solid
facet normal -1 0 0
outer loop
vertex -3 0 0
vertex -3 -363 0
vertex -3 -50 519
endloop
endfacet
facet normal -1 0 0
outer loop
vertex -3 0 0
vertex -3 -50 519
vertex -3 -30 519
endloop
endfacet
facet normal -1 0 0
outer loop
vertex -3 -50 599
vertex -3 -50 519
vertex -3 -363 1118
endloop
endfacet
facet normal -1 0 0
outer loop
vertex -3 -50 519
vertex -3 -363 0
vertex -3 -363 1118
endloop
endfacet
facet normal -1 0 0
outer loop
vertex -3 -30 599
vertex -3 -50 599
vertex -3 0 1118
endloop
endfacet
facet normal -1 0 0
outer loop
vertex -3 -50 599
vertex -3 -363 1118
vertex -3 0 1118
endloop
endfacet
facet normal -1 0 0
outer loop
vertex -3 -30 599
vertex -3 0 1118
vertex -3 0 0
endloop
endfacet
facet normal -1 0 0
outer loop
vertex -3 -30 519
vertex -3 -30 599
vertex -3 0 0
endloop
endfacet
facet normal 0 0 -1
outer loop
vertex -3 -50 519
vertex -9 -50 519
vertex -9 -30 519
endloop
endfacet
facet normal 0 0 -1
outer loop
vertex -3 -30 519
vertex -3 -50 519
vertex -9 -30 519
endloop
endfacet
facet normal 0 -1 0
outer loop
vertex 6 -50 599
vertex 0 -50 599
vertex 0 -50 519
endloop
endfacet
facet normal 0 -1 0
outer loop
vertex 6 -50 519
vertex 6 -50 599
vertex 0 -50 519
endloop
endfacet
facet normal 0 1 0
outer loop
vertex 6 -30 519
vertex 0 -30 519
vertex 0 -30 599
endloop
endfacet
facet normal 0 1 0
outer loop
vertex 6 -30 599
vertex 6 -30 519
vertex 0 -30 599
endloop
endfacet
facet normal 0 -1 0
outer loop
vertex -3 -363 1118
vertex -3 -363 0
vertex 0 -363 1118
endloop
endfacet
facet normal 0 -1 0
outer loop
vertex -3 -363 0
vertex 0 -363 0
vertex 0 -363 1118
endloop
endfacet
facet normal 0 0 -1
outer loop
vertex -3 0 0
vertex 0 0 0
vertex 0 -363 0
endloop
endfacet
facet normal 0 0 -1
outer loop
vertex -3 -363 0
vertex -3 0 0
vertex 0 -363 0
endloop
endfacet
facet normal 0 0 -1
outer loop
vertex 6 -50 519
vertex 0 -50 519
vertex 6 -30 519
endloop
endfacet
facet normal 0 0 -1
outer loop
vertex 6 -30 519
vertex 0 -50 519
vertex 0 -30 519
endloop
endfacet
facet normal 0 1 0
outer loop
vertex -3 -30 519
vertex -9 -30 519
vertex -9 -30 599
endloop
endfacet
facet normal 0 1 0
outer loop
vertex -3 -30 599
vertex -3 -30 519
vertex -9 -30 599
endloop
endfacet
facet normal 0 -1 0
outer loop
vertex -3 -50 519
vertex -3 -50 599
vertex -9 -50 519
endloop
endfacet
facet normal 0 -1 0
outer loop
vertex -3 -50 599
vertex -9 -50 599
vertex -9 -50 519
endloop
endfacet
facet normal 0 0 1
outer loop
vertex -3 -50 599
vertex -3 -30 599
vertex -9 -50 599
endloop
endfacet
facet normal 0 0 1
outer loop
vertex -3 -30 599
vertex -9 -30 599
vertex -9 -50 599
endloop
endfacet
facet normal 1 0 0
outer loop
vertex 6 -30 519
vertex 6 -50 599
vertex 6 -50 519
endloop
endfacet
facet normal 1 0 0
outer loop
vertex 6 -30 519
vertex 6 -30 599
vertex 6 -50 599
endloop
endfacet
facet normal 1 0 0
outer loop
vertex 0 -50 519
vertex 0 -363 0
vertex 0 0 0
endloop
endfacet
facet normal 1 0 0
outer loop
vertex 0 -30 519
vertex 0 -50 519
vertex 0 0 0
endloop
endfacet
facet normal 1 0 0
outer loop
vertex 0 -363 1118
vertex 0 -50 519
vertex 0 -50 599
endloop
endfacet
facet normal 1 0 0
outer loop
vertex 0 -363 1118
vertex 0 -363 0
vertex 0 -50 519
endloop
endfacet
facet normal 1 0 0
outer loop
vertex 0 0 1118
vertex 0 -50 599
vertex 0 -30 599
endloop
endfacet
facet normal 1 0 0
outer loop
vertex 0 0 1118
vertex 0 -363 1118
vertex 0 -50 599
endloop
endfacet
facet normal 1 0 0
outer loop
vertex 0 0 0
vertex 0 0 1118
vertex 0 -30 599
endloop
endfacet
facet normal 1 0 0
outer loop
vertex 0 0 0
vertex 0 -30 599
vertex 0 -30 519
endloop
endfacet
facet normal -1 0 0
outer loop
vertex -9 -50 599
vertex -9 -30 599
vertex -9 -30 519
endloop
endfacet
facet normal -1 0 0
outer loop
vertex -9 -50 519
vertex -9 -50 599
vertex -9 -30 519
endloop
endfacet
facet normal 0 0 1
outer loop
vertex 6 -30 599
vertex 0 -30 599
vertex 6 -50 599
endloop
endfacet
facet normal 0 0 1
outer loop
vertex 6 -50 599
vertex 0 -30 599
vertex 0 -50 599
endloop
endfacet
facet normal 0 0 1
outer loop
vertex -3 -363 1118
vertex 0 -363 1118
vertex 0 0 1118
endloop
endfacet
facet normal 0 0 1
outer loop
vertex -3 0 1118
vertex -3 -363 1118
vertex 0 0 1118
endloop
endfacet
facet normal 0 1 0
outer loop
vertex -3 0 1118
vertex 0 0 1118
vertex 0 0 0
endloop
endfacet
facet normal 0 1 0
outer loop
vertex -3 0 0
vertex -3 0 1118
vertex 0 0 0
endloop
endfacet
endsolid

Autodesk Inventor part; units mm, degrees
ref_plane "YZ Plane" through (0, 0, 0) normal (1, 0, 0) x (0, 1, 0)
ref_plane "XZ Plane" through (0, 0, 0) normal (0, 1, 0) x (-1, 0, 0)
ref_plane "XY Plane" through (0, 0, 0) normal (0, 0, 1) x (1, 0, 0)
sketch "Sketch1" plane through (0, 0, 0) normal (1, 0, 0) x (0, 1, 0)
  line L0 (0, 0) -> (-363, 0)
  line L1 (-363, 0) -> (-363, 1118)
  line L2 (-363, 1118) -> (0, 1118)
  line L3 (0, 1118) -> (0, 0)
  dimension "d0" = 363
  dimension "d1" = 1118
extrude "Extrusion1" add sketch "Sketch1" against normal blind 3
sketch "Sketch2" plane through (0, 0, 0) normal (1, 0, 0) x (0, 0, -1)
  line L0 (-1118, 0) -> (-1118, -363) projected
  line L1 (-1118, -363) -> (0, -363) projected
  line L2 (0, -363) -> (0, 0) projected
  line L3 (0, 0) -> (-1118, 0) projected
  line L4 (-1118, 0) -> (0, 0) construction
  line L5 (-559, 0) -> (-559, -40) construction
  line L6 (-519, -30) -> (-599, -30)
  line L7 (-599, -30) -> (-599, -50)
  line L8 (-599, -50) -> (-519, -50)
  line L9 (-519, -50) -> (-519, -30)
  line L10 (-519, -30) -> (-599, -50) construction
  line L11 (-599, -30) -> (-519, -50) construction
  dimension "d4" = 40
  dimension "d5" = 80
  dimension "d6" = 20
extrude "Extrusion2" add sketch "Sketch2" along normal blind 6 and the other way blind 9 contours L9 L8 L7 L6
equation "\"d0\" = portaLargura"
equation "\"portaLargura\" = 363"
properties part number "acrilicoMovel1"
